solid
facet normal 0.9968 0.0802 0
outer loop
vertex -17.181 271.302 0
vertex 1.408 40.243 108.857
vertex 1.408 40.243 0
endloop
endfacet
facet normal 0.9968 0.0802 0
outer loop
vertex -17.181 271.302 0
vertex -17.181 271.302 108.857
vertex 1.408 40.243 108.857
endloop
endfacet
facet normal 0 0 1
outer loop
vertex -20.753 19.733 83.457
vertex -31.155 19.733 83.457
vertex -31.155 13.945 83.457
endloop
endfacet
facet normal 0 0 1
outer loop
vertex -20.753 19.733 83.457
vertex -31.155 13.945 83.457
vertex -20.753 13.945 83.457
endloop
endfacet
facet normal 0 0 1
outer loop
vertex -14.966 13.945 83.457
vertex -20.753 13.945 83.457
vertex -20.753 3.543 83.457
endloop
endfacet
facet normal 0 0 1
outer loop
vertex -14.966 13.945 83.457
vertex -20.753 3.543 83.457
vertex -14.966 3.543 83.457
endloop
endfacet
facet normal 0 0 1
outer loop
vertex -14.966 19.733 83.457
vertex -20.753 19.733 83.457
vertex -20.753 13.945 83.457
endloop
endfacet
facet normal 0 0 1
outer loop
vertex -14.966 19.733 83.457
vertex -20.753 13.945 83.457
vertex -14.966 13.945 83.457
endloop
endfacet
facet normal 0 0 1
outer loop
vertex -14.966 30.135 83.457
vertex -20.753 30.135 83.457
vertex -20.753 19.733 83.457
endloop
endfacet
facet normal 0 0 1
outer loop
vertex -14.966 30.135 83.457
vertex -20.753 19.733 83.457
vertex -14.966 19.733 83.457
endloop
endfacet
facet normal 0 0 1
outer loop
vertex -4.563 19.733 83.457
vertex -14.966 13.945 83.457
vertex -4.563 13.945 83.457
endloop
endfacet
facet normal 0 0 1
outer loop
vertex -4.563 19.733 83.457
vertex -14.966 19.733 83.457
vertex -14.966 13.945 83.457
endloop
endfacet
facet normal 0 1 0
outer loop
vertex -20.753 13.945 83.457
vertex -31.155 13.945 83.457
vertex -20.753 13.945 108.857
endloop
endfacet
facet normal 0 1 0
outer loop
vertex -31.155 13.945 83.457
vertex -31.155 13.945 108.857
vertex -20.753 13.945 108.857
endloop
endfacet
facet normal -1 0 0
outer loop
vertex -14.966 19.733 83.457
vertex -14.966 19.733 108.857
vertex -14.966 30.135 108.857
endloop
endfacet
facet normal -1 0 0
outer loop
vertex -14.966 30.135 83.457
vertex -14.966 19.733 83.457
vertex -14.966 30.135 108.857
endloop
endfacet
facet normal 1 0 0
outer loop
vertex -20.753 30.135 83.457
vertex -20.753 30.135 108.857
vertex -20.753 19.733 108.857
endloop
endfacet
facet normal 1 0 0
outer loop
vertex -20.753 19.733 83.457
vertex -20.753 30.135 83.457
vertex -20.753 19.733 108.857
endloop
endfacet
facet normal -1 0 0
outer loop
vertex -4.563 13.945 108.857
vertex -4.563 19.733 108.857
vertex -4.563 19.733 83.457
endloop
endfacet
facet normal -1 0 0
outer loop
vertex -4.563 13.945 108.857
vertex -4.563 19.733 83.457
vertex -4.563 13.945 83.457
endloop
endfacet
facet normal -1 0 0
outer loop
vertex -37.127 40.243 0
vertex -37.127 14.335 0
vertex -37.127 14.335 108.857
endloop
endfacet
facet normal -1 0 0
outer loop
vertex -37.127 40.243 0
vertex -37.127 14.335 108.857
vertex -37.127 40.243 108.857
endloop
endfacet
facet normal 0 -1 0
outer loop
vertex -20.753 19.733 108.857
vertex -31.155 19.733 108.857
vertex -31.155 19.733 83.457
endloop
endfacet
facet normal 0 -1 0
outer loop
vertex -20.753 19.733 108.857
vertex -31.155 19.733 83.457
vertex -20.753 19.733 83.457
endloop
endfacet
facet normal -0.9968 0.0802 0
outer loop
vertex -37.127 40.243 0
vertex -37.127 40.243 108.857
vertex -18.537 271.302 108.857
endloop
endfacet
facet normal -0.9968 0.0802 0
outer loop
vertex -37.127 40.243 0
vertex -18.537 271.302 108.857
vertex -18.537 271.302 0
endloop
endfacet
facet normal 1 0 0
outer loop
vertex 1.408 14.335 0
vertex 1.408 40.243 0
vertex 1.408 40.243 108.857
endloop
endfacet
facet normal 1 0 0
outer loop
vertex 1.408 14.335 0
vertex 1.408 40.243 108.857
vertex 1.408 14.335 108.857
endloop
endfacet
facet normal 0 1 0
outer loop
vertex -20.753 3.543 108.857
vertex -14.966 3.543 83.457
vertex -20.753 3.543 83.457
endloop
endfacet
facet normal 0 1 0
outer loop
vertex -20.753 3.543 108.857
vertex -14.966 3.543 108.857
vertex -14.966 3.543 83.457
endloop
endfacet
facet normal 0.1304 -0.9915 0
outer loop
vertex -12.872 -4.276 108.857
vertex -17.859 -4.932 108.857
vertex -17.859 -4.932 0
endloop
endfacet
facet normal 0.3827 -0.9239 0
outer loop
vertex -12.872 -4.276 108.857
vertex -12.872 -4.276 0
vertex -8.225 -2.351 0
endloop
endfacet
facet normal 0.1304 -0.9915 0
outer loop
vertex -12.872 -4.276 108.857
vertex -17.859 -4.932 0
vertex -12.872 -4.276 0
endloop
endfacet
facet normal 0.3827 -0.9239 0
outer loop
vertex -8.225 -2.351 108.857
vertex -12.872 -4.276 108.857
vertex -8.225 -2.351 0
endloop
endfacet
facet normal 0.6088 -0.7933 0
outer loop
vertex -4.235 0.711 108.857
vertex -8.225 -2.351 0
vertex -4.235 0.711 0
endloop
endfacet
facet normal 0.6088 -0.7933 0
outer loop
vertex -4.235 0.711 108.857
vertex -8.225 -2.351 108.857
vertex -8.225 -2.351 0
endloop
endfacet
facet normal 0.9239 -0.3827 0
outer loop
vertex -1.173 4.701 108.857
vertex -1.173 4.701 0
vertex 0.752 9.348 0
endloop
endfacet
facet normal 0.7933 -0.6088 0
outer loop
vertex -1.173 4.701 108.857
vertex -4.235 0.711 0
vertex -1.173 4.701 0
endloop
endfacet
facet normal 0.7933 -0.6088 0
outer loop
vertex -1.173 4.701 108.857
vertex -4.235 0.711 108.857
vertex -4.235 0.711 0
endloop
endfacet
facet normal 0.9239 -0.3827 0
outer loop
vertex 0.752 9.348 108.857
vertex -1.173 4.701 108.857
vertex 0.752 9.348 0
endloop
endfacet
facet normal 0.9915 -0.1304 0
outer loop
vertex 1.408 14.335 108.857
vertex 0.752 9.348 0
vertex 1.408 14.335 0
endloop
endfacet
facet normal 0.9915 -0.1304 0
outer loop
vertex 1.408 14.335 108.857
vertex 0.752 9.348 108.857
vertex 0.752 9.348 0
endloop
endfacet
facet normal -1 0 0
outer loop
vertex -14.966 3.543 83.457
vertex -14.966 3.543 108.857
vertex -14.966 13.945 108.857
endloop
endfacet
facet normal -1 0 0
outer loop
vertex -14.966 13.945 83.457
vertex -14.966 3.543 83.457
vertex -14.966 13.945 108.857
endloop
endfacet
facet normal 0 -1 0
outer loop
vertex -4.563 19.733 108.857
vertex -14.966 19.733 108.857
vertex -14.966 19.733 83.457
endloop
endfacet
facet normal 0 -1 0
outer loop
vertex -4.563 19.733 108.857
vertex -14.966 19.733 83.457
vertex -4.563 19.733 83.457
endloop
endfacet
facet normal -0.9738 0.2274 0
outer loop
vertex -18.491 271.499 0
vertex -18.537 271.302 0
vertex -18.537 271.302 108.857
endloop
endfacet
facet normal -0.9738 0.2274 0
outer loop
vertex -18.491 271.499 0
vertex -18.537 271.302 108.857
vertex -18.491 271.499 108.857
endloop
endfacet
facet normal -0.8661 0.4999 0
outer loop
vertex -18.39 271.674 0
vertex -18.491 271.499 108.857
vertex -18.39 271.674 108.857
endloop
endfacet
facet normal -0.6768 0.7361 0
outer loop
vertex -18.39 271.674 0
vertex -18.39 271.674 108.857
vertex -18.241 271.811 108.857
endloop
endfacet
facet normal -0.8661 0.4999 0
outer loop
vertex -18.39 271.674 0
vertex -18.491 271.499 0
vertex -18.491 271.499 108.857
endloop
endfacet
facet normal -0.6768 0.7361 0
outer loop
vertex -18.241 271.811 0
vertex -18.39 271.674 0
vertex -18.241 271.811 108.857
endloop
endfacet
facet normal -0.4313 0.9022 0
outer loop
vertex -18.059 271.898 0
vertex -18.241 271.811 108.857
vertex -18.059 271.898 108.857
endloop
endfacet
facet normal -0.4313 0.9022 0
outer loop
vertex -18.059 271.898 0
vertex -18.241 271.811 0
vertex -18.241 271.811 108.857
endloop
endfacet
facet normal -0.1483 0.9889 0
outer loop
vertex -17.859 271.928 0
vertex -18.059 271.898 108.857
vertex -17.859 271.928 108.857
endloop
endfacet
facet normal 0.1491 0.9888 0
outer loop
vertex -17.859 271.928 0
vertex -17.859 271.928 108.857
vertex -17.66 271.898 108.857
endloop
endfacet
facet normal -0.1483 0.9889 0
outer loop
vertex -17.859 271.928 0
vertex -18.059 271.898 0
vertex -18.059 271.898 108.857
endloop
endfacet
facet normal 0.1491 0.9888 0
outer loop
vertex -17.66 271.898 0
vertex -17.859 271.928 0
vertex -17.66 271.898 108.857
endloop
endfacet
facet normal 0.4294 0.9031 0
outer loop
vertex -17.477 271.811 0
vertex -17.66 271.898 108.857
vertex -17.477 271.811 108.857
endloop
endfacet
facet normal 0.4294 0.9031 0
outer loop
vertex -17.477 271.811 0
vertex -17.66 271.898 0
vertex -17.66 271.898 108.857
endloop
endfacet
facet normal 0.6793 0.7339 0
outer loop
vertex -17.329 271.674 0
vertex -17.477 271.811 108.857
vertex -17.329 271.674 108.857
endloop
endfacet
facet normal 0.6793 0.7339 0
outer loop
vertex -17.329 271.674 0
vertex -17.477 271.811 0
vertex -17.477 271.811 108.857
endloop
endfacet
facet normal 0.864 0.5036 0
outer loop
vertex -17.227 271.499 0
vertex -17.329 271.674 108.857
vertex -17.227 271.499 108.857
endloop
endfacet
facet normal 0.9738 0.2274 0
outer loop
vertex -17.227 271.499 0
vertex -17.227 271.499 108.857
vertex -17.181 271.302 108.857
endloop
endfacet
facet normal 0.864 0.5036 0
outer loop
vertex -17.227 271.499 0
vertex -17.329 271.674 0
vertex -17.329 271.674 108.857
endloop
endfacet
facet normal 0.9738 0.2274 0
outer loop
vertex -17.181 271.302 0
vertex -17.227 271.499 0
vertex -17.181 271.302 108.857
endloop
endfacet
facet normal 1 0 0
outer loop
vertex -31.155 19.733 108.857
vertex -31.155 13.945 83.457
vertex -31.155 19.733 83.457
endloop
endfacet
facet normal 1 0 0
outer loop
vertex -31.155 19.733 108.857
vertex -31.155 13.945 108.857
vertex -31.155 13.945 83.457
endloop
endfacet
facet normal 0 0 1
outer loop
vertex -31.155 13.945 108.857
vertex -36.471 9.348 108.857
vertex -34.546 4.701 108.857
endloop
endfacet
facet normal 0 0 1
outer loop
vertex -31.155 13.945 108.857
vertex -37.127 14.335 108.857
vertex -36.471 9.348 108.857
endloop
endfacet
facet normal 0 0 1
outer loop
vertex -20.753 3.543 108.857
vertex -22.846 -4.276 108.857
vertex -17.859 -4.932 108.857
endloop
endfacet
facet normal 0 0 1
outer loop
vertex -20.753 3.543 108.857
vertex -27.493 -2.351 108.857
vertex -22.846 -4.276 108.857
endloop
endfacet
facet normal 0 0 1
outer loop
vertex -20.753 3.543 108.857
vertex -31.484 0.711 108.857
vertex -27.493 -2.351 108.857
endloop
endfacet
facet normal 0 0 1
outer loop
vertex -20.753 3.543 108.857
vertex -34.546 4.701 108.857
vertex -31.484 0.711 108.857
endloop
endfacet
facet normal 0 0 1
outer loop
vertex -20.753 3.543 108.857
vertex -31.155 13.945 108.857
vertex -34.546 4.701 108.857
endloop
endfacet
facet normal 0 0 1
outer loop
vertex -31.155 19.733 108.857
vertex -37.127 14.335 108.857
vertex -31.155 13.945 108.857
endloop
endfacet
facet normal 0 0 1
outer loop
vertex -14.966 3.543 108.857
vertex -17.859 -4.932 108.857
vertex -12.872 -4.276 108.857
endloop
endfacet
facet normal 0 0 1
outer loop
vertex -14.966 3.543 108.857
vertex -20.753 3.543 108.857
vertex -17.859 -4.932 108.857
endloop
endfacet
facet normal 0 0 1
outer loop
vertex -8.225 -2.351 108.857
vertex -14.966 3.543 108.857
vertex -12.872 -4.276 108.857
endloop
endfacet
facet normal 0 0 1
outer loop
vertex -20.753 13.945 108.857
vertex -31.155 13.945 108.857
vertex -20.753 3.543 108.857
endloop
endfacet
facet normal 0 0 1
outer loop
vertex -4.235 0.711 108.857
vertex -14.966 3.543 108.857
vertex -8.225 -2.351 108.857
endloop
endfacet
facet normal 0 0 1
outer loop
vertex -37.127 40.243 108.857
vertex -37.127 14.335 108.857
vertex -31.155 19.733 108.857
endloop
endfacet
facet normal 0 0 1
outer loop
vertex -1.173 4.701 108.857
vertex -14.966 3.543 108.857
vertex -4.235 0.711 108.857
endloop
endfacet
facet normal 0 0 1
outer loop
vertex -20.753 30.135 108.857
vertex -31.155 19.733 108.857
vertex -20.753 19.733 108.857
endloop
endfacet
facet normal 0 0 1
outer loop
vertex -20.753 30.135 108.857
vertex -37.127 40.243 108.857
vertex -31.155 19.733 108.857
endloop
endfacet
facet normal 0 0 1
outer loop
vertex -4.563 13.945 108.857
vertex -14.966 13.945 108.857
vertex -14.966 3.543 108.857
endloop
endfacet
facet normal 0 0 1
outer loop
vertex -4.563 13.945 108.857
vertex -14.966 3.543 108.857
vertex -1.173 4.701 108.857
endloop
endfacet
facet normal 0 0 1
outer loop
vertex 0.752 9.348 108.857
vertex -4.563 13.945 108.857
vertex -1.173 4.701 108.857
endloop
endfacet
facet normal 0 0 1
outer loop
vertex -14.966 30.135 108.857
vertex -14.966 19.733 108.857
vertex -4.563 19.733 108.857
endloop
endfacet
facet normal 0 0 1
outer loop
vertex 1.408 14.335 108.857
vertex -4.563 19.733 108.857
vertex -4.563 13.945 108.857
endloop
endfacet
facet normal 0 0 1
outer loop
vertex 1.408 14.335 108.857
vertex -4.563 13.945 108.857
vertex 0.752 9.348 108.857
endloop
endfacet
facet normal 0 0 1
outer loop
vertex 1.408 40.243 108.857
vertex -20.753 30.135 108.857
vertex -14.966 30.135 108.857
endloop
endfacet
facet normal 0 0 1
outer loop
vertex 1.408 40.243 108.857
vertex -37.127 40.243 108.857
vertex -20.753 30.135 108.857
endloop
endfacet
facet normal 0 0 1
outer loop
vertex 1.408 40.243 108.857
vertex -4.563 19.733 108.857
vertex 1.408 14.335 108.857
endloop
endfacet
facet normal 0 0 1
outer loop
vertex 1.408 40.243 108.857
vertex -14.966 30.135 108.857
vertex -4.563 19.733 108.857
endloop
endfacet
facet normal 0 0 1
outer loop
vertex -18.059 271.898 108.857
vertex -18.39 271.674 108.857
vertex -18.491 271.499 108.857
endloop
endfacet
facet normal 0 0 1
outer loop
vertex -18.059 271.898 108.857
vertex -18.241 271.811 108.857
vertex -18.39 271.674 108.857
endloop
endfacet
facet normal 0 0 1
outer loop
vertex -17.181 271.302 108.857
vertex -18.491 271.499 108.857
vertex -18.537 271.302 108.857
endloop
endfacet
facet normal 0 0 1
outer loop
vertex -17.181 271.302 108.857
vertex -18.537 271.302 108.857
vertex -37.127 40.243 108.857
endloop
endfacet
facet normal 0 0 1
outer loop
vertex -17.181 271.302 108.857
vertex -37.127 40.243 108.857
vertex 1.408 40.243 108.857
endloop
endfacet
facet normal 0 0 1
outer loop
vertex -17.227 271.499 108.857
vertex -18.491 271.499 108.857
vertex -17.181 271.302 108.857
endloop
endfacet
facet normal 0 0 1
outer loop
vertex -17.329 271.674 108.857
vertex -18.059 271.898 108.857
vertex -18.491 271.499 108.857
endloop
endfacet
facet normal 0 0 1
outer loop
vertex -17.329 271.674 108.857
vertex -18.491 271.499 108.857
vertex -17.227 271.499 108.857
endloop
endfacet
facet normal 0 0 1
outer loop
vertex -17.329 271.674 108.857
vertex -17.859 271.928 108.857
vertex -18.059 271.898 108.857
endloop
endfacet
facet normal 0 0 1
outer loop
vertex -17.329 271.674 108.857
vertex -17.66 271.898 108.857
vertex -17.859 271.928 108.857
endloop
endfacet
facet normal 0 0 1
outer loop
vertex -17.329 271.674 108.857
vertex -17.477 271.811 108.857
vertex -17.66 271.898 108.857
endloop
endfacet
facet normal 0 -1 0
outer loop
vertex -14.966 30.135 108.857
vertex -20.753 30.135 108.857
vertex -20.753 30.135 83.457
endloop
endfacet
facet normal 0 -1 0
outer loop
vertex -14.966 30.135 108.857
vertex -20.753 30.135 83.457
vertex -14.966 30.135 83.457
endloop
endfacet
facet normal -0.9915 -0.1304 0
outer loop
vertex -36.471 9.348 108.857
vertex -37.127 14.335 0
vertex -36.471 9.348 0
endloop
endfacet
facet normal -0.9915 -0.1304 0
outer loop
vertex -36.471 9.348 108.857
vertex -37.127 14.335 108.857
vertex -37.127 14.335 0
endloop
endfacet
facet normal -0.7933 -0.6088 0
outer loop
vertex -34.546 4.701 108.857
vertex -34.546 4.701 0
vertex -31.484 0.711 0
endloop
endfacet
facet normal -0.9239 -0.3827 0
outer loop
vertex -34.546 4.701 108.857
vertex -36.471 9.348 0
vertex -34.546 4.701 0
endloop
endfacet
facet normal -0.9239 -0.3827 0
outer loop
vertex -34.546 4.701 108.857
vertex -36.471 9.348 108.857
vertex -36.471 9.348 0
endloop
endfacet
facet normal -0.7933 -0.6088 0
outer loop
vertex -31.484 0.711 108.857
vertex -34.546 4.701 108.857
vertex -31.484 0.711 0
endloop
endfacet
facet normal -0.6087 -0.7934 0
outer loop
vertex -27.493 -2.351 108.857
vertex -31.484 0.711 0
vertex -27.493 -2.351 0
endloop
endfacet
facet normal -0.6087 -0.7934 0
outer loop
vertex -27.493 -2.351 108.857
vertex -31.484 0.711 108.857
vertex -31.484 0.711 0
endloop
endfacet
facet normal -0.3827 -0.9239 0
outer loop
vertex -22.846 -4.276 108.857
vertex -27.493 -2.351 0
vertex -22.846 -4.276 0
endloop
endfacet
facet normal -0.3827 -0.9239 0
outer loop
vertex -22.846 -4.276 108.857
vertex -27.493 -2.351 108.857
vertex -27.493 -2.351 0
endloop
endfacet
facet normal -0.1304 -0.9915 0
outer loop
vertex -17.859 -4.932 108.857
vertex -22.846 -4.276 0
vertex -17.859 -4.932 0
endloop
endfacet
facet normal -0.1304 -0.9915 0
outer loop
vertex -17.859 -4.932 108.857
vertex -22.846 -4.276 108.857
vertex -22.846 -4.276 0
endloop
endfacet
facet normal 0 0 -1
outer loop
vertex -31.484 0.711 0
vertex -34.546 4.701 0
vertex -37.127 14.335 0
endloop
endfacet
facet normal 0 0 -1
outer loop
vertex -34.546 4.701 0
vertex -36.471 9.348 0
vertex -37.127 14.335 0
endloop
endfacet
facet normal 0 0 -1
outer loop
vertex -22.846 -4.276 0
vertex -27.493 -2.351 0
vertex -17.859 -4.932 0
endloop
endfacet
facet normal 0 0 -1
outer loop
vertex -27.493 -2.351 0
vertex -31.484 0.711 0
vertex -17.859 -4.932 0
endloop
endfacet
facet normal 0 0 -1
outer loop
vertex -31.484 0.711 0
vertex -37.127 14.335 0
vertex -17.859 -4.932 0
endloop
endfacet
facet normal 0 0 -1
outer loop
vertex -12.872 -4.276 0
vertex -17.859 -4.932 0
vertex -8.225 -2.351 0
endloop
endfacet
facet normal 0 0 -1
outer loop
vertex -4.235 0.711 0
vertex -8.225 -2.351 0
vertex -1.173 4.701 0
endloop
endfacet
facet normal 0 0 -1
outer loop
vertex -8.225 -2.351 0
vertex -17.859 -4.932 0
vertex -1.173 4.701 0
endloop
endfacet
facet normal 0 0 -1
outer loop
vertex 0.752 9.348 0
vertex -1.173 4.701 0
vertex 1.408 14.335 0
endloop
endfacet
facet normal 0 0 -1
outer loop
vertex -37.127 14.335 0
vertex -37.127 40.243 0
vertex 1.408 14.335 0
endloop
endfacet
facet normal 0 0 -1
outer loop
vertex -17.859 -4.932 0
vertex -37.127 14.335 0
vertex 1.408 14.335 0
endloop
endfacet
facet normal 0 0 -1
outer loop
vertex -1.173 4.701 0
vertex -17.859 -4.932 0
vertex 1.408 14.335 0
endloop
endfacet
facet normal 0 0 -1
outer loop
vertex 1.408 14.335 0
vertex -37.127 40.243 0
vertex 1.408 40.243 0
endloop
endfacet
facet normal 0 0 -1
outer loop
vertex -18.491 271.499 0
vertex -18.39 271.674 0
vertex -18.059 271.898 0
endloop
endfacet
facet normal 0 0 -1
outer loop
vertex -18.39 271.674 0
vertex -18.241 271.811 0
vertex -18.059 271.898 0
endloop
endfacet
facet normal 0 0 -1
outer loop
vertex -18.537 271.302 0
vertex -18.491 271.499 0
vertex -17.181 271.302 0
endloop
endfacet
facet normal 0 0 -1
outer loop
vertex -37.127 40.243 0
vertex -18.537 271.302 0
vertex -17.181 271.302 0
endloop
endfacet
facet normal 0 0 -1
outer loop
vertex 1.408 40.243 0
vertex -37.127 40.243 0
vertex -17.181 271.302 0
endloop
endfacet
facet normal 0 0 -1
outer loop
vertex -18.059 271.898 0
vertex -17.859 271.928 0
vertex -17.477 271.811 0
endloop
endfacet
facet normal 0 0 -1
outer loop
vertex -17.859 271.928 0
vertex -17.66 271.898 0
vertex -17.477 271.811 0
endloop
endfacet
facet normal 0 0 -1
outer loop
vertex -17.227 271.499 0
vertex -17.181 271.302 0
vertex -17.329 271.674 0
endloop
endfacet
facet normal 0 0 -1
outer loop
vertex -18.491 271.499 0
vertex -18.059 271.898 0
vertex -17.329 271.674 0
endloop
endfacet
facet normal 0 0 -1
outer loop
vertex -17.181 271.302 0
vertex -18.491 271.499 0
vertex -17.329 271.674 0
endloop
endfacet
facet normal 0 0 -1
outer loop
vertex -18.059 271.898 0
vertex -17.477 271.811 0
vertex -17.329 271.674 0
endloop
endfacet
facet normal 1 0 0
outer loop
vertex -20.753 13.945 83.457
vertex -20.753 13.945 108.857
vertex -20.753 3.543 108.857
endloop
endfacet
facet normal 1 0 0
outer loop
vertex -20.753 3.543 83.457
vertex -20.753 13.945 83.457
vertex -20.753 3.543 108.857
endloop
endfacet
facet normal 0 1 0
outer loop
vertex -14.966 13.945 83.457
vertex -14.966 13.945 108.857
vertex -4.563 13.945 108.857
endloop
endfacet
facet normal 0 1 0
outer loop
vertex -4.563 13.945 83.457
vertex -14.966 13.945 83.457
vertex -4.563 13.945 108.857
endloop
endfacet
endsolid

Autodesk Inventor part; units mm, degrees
ref_plane "YZ Plane" through (0, 0, 0) normal (1, 0, 0) x (0, 1, 0)
ref_plane "XZ Plane" through (0, 0, 0) normal (0, 1, 0) x (-1, 0, 0)
ref_plane "XY Plane" through (0, 0, 0) normal (0, 0, 1) x (1, 0, 0)
sketch "Sketch1" plane through (0, 0, 0) normal (0, 0, 1) x (1, 0, 0)
  line L0 (-37.1271, 279.7291) -> (1.4084, 279.7291)
  line L1 (1.4084, 279.7291) -> (1.4084, -4.9324)
  line L2 (1.4084, -4.9324) -> (-37.1271, -4.9324)
  line L3 (-37.1271, -4.9324) -> (-37.1271, 279.7291)
  point P0 (0, 0)
  dimension "d0" = 38.5354
  dimension "d1" = 284.6614
extrude "Extrusion1" add sketch "Sketch1" along normal blind 108.8571
sketch "Sketch2" plane through (0, 0, 108.8571) normal (0, 0, 1) x (1, 0, 0)
  line L0 (-37.1271, -4.9324) -> (1.4084, -4.9324) projected
  line L1 (-17.8594, -4.9324) -> (-17.8594, 16.8391) construction
  circle A0 centre (-17.8594, 16.8391) radius 13.6071 construction
  line L2 (-17.8594, 16.8391) -> (-20.753, 30.135) construction
  line L3 (-17.8594, 16.8391) -> (-14.9657, 30.135) construction
  line L4 (-20.753, 30.135) -> (-14.9657, 30.135)
  line L5 (-17.8594, 16.8391) -> (-31.1553, 13.9454) construction
  line L6 (-31.1553, 13.9454) -> (-31.1553, 19.7327)
  line L7 (-17.8594, 16.8391) -> (-14.9657, 3.5432) construction
  line L8 (-14.9657, 3.5432) -> (-20.753, 3.5432)
  line L9 (-17.8594, 16.8391) -> (-4.5634, 19.7327) construction
  line L10 (-4.5634, 19.7327) -> (-4.5634, 13.9454)
  line L11 (-20.753, 30.135) -> (-20.753, 19.7327)
  line L12 (-20.753, 13.9454) -> (-20.753, 3.5432)
  line L13 (-31.1553, 13.9454) -> (-20.753, 13.9454)
  line L14 (-14.9657, 13.9454) -> (-4.5634, 13.9454)
  line L15 (-14.9657, 3.5432) -> (-14.9657, 13.9454)
  line L16 (-14.9657, 19.7327) -> (-14.9657, 30.135)
  line L17 (-14.9657, 19.7327) -> (-4.5634, 19.7327)
  line L18 (-31.1553, 19.7327) -> (-20.753, 19.7327)
  point P0 (0, 0)
  dimension "d4" = 21.7714
  dimension "d5" = 27.2143
  dimension "d18" = 360
fillet "Fillet1" radius 19.2677 2 edges at (1.4084, -4.9324, 54.4286) (-37.1271, -4.9324, 54.4286)
chamfer "Chamfer1" distance 19.2677 distance2 239.4857 1 edges at (-37.1271, 279.7291, 54.4286) measured on face at (-11.4368, 279.7291, 36.2857)
chamfer "Chamfer2" distance 239.4857 distance2 19.2677 1 edges at (1.4084, 279.7291, 54.4286) measured on face at (1.4084, 102.7999, 36.2857)
sketch "Sketch3" plane through (0, 0, 108.8571) normal (0, 0, 1) x (1, 0, 0)
  point P0 (0, 0)
extrude "Extrusion3" cut sketch "Sketch2" against normal blind 25.4
sketch "Sketch4" plane through (0, 0, 108.8571) normal (0, 0, 1) x (1, 0, 0)
  line L0 (-31.1553, 19.7327) -> (-31.1553, 13.9454) projected
  line L1 (-31.1553, 13.9454) -> (-31.1553, 19.7327) projected
  line L2 (-31.1553, 16.8391) -> (-13.0927, 16.8391) construction
  line L3 (-4.5634, 19.7327) -> (-14.9657, 19.7327) projected
  circle A0 centre (-17.8594, 16.8391) radius 4.0922
  point P0 (0, 0)
fillet "Fillet3" radius 0.6802 2 edges at (-17.8593, 279.7291, 54.4286) (-17.8594, 279.7291, 54.4286)
properties part number "Bistable Flipper 2" material "Stainless Steel, Polished"
